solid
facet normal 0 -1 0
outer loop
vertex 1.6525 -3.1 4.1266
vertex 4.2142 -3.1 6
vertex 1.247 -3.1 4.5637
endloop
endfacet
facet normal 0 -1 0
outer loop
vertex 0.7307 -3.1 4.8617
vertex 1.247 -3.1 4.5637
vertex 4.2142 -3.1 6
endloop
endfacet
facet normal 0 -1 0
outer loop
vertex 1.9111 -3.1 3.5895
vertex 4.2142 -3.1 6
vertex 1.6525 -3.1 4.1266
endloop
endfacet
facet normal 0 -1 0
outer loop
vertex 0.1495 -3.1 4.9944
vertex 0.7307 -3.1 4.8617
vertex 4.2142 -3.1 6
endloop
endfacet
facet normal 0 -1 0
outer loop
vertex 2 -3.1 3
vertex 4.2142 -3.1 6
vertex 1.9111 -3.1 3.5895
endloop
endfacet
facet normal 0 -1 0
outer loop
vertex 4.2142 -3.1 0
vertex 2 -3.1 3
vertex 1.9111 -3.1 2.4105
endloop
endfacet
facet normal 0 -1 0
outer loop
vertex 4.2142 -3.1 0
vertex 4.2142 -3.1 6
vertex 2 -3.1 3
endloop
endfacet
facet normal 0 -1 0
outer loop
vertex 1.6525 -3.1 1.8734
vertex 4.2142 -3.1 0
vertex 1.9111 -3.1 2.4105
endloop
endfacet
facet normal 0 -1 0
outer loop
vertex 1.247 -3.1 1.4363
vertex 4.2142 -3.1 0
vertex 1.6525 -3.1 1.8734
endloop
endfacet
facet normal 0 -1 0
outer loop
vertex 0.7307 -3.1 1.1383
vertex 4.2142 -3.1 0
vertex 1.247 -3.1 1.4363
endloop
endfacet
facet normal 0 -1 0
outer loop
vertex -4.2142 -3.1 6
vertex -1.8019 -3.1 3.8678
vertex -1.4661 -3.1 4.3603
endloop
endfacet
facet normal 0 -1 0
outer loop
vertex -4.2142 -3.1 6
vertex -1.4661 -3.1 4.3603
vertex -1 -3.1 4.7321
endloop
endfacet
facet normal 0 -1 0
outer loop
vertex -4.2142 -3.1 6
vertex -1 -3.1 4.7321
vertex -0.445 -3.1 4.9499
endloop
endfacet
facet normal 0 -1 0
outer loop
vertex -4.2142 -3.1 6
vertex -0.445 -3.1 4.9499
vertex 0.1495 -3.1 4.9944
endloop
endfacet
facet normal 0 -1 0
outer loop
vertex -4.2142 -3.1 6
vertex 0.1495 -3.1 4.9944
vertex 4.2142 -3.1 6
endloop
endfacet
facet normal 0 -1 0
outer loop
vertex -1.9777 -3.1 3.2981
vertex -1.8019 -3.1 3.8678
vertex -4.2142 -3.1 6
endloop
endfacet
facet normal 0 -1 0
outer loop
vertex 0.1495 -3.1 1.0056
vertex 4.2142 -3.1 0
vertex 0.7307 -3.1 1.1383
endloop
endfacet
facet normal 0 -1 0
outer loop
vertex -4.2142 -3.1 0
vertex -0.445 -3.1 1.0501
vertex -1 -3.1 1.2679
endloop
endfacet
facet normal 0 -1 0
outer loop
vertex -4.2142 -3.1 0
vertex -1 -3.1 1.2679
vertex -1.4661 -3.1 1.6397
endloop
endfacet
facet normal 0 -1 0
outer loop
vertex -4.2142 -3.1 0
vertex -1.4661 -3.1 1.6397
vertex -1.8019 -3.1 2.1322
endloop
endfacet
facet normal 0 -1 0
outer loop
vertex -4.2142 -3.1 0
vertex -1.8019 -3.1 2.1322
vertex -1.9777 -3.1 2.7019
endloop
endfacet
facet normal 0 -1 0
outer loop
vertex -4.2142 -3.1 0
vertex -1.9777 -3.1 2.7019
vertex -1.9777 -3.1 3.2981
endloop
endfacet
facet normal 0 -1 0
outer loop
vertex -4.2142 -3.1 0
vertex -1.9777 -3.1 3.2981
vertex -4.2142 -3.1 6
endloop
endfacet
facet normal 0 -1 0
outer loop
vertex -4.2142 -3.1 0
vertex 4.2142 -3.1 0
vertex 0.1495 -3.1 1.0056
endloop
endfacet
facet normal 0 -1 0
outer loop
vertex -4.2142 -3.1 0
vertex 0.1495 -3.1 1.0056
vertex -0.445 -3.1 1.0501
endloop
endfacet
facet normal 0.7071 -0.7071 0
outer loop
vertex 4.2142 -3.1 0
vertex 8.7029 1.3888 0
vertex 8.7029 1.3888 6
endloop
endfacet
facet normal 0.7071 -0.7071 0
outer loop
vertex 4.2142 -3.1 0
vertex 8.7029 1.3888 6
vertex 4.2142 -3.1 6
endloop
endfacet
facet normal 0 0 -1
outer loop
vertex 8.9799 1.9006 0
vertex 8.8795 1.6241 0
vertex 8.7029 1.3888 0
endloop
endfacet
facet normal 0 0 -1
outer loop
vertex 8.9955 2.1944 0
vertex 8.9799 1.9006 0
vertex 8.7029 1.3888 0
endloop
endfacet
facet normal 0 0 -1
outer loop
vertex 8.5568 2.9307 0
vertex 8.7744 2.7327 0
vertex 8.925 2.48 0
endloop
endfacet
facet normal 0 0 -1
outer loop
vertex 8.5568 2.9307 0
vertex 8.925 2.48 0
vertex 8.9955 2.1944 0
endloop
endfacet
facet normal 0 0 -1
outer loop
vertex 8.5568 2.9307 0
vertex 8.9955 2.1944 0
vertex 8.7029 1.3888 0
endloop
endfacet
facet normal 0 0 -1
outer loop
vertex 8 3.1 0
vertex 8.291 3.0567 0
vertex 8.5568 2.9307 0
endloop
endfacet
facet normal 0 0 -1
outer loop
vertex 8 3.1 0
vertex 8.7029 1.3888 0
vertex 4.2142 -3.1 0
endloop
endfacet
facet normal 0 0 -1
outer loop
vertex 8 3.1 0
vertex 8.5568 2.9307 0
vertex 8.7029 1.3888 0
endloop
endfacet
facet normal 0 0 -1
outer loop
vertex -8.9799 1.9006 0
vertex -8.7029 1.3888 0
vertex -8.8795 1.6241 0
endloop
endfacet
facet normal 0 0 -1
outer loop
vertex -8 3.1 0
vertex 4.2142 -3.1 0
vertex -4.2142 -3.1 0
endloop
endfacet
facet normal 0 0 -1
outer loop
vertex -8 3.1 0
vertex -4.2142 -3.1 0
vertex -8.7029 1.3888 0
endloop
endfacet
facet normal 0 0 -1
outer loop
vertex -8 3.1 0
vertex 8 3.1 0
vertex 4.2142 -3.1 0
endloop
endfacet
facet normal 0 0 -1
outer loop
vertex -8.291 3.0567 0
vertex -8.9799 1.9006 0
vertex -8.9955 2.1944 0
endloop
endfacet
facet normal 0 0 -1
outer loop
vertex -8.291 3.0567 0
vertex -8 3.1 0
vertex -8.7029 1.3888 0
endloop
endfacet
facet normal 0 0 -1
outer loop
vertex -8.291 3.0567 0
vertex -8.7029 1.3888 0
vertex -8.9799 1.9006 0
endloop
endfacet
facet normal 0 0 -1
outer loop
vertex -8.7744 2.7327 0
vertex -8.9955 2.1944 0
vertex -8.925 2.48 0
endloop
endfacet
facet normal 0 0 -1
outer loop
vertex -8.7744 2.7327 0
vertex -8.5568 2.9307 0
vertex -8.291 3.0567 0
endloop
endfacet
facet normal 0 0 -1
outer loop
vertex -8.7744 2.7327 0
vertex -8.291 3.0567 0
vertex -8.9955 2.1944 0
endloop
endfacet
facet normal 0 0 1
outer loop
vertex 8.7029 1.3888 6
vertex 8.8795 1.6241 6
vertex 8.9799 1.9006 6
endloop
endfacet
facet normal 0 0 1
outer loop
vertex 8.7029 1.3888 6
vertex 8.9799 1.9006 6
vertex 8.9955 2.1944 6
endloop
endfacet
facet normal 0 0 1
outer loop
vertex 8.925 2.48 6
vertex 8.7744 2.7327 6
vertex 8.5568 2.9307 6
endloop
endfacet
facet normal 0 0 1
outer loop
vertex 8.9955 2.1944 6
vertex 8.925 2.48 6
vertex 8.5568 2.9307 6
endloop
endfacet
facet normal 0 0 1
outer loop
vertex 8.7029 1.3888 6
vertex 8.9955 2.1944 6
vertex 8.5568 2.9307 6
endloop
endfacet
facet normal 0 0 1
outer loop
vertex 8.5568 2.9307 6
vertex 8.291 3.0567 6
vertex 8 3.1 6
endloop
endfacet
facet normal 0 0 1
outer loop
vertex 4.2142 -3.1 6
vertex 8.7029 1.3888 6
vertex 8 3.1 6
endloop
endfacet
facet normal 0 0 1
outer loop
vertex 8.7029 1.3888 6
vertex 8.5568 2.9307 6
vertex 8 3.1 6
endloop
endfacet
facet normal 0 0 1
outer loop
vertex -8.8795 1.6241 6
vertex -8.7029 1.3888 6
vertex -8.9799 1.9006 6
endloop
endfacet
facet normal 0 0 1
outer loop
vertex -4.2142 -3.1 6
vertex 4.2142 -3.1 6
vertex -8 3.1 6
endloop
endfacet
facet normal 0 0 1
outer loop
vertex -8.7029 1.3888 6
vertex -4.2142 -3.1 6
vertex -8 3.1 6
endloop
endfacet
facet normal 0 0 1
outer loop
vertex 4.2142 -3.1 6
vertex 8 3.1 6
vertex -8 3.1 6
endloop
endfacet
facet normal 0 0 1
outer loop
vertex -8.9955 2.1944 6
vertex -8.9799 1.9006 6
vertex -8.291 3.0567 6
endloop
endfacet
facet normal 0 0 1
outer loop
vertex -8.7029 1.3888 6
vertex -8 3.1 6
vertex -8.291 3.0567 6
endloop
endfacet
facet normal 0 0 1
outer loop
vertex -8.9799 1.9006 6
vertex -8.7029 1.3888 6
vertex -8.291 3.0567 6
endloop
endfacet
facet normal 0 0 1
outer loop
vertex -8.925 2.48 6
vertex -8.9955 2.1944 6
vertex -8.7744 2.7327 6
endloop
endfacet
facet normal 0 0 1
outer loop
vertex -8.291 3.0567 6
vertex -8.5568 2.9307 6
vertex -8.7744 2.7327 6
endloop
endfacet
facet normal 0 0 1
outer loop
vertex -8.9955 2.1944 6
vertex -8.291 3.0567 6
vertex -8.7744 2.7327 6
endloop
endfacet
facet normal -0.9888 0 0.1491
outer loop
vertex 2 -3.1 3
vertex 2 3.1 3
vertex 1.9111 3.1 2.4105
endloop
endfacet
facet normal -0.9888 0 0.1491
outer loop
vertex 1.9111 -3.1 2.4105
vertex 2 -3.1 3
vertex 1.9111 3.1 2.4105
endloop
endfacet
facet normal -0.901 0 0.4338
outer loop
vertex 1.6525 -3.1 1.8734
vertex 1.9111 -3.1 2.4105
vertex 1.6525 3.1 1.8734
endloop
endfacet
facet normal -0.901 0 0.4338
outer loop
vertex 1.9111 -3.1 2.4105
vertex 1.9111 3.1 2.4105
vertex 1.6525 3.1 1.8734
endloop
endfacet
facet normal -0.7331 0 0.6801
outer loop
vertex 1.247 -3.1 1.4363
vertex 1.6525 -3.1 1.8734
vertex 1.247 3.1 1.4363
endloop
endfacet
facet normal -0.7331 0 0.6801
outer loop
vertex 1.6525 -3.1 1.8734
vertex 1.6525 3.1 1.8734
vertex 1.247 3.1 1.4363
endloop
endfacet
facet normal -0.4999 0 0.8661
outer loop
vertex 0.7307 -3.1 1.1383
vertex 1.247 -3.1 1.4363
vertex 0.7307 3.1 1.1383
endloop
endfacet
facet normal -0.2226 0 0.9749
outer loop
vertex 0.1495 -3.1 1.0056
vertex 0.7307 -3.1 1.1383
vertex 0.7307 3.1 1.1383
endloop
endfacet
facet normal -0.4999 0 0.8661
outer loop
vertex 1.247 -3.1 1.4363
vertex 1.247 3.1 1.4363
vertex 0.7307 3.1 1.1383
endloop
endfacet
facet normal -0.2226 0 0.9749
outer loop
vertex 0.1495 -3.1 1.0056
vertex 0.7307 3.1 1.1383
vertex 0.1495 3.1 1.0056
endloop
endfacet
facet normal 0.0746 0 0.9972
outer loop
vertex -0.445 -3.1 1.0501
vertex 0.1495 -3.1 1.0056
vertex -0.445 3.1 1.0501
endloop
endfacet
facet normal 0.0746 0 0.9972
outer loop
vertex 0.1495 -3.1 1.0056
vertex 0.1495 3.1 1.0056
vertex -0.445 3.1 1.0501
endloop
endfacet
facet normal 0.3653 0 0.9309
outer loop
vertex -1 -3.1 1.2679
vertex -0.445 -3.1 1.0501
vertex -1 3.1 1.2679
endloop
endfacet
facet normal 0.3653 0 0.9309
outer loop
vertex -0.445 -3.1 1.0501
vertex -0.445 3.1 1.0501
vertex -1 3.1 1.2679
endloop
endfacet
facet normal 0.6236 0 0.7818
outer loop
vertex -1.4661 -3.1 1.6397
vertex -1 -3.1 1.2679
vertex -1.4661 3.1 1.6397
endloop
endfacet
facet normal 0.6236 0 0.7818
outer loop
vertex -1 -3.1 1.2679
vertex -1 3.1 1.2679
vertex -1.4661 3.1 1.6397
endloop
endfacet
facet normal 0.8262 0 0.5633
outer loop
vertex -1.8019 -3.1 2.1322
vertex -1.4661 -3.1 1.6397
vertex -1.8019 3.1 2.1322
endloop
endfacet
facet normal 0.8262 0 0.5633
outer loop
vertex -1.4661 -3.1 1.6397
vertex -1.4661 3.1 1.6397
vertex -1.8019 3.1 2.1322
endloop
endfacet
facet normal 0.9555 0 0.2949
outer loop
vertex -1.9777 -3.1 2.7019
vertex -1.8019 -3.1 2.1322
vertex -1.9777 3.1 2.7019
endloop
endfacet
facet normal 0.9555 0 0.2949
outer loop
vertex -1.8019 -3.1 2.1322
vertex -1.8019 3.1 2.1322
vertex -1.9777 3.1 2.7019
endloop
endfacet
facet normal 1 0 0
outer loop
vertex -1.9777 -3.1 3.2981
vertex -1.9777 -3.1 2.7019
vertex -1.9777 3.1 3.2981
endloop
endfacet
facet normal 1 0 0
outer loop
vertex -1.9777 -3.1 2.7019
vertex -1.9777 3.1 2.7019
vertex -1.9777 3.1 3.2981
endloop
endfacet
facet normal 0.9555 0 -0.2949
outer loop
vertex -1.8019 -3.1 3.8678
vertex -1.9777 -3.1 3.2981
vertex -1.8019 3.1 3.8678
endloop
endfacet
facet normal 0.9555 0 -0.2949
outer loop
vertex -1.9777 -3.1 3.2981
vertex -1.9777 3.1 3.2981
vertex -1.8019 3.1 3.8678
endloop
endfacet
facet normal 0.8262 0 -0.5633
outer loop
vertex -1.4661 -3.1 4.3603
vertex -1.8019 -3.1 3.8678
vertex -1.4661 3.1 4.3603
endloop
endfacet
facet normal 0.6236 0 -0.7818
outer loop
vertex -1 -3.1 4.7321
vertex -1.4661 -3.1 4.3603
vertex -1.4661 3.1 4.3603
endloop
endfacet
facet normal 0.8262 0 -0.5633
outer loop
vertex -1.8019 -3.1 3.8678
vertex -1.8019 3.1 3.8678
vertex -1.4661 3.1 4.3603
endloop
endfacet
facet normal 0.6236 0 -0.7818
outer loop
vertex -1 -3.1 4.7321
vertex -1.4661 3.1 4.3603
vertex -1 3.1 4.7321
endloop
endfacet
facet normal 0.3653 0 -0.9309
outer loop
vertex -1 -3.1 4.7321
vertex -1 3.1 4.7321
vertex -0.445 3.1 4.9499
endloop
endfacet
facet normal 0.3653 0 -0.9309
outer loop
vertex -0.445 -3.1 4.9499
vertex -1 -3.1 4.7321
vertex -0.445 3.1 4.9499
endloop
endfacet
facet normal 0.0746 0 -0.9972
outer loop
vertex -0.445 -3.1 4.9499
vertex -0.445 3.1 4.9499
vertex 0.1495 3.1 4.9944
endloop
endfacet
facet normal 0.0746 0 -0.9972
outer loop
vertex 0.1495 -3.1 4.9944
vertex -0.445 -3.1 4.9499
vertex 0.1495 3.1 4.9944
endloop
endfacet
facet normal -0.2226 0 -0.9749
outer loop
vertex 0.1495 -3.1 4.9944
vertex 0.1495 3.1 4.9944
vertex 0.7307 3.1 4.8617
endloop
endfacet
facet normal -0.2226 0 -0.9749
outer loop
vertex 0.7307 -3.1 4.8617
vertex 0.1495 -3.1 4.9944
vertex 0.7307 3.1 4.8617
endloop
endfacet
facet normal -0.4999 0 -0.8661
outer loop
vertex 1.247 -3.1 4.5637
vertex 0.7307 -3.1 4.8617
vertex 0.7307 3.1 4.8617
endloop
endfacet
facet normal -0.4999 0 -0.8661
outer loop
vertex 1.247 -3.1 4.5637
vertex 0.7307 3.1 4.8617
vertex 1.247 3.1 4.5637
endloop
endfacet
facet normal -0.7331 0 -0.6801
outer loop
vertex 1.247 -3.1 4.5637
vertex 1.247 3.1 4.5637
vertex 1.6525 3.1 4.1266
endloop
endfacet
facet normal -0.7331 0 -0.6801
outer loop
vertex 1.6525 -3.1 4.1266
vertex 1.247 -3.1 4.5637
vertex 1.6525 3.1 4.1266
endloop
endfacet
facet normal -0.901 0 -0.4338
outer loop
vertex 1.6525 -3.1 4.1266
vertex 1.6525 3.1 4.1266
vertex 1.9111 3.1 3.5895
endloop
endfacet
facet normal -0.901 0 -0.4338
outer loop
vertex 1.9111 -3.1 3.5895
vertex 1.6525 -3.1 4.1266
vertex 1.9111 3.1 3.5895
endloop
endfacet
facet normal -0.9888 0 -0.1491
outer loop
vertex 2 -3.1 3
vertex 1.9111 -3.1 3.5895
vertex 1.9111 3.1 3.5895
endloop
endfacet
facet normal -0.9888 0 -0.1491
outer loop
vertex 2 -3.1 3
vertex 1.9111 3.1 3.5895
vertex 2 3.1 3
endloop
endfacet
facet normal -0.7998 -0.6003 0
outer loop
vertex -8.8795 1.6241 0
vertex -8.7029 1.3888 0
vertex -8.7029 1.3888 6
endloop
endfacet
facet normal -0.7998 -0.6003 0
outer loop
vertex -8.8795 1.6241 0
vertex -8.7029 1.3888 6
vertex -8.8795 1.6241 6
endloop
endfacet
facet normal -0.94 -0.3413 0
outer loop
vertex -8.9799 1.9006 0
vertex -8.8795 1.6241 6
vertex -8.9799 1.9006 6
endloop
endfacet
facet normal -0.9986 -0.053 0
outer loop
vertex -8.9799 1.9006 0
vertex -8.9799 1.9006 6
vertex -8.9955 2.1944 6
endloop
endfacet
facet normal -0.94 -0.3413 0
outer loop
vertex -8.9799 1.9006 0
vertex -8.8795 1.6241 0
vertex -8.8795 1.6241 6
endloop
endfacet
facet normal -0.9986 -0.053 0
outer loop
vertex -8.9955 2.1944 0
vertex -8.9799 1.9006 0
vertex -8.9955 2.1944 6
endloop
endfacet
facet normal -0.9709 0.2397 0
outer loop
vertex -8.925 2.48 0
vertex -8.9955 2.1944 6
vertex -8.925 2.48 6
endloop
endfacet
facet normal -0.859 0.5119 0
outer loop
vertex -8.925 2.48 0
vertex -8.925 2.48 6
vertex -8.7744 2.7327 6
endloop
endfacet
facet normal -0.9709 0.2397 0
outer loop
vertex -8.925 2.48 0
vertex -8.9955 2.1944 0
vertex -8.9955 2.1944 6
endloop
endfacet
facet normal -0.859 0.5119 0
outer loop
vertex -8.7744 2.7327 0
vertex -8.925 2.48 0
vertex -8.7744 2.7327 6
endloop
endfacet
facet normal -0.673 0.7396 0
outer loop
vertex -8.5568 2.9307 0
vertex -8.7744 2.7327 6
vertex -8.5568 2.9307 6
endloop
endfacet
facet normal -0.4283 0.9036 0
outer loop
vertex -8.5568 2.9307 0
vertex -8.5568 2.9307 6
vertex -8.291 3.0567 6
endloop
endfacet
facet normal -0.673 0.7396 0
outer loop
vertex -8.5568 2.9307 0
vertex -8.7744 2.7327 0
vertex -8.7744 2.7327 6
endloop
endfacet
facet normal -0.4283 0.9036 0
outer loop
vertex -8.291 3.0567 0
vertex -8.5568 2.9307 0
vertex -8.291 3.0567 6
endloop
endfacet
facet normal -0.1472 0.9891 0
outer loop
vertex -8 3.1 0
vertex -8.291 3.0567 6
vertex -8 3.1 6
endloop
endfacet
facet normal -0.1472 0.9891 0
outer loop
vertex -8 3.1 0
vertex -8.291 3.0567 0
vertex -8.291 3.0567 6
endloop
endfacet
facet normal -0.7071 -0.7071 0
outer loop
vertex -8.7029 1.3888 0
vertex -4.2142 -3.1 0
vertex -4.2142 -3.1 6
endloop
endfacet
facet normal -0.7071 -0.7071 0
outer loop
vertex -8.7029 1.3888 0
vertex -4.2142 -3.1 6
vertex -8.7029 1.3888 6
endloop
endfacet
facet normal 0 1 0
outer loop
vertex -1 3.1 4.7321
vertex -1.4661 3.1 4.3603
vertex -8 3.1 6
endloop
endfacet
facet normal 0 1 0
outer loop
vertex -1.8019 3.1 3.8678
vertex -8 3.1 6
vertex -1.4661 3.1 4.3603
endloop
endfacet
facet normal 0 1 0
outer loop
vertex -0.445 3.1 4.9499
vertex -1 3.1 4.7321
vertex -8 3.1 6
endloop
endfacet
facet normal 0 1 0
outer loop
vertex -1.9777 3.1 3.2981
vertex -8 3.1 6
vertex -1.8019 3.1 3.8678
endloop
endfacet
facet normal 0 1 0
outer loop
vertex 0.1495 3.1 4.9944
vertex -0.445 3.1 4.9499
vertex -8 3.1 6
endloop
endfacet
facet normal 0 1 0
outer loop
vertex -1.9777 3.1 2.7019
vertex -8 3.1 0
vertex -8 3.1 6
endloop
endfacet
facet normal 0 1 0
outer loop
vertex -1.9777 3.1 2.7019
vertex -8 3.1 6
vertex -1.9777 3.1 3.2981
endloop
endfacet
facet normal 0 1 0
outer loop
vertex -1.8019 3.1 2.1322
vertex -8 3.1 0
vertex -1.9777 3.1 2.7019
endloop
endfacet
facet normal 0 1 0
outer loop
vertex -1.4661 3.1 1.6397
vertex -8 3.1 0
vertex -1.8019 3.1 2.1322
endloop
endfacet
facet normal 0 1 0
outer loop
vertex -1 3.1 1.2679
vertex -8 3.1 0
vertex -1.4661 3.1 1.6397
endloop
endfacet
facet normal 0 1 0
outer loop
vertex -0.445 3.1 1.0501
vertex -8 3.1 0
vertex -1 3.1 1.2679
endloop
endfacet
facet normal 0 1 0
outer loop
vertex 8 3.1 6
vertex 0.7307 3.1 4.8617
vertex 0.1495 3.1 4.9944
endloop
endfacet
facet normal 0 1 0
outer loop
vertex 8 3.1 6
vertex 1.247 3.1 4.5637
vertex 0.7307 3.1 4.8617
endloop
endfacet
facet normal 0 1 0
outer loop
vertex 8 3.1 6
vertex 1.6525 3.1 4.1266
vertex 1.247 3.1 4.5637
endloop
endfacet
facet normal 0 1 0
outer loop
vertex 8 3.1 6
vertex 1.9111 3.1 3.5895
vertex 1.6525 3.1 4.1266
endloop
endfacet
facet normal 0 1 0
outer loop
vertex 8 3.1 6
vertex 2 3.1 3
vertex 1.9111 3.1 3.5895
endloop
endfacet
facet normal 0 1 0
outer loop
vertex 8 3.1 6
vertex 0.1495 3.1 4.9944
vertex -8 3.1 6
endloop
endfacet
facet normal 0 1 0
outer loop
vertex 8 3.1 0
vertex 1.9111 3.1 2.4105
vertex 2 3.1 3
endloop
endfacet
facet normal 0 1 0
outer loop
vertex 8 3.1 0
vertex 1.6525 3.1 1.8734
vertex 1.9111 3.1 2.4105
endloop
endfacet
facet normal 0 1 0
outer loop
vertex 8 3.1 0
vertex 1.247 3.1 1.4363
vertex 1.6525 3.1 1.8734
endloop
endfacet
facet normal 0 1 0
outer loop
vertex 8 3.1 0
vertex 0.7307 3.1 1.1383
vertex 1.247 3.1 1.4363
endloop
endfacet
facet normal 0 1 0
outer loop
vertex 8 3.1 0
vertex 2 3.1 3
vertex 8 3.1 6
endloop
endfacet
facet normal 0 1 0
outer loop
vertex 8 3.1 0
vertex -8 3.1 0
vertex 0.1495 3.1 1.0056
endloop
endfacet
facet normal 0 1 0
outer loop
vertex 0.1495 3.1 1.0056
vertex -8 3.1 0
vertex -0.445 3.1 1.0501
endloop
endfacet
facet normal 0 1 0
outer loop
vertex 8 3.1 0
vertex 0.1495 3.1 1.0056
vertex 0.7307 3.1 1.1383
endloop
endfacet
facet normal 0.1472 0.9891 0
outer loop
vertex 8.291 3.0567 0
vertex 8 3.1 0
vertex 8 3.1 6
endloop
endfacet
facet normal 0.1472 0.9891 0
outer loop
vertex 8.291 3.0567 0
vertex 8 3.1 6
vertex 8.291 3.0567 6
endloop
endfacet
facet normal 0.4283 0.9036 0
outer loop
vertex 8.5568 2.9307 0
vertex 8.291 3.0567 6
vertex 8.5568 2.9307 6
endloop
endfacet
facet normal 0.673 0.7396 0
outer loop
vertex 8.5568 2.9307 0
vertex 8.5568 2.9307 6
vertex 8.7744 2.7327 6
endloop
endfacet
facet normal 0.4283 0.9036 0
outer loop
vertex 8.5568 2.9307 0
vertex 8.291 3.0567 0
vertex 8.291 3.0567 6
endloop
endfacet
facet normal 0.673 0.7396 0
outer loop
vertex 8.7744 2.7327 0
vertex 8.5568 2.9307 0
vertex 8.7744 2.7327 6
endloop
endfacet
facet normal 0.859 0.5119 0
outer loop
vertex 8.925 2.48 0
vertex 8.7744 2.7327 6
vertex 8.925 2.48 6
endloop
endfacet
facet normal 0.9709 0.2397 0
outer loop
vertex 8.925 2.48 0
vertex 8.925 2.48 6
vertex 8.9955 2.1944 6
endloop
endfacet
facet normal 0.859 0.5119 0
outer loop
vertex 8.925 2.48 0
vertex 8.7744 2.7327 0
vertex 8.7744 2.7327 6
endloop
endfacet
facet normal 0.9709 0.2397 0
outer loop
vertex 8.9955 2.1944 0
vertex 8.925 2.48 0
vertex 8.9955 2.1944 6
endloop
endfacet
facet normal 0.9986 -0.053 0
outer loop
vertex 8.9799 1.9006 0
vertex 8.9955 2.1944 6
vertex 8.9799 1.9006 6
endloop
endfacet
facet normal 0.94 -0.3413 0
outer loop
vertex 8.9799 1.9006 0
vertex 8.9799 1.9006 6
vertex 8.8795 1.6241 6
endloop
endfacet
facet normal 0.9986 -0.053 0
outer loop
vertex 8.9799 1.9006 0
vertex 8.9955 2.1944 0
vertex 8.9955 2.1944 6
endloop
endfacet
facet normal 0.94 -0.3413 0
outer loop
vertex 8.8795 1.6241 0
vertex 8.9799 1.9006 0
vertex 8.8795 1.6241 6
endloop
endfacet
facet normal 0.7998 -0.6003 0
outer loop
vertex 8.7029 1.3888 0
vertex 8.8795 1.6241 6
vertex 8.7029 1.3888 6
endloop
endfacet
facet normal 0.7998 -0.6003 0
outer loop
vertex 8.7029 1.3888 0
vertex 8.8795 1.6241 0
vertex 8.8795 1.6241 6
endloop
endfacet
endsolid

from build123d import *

# Parameters (mm, degrees)
BOSS_EXTRUDE1_DEPTH = 6
SKETCH2_R           = 2
CUT_EXTRUDE1_DEPTH  = 8


with BuildPart() as part:
    # Sketch1 → Boss-Extrude1 (new body)
    with BuildSketch(Plane.XY):
        with BuildLine():
            Line((-8, 3.1), (8, 3.1))
            ThreePointArc((8, 3.1), (8.925, 2.479967104), (8.702939142, 1.38875))
            Line((8.702939142, 1.38875), (4.214189142, -3.1))
            Line((4.214189142, -3.1), (-4.214189142, -3.1))
            Line((-4.214189142, -3.1), (-8.702939142, 1.38875))
            ThreePointArc((-8.702939142, 1.38875), (-8.925, 2.479967104), (-8, 3.1))
        make_face()
    extrude(amount=BOSS_EXTRUDE1_DEPTH)

    # Sketch2 → Cut-Extrude1 (cut)
    with BuildSketch(Plane(origin=(0, 3.1, 0), x_dir=(1, 0, 0), z_dir=(0, 1, 0))):
        with Locations((0, -3)):
            Circle(SKETCH2_R)
    extrude(amount=-CUT_EXTRUDE1_DEPTH, mode=Mode.SUBTRACT)


solid = part.part
